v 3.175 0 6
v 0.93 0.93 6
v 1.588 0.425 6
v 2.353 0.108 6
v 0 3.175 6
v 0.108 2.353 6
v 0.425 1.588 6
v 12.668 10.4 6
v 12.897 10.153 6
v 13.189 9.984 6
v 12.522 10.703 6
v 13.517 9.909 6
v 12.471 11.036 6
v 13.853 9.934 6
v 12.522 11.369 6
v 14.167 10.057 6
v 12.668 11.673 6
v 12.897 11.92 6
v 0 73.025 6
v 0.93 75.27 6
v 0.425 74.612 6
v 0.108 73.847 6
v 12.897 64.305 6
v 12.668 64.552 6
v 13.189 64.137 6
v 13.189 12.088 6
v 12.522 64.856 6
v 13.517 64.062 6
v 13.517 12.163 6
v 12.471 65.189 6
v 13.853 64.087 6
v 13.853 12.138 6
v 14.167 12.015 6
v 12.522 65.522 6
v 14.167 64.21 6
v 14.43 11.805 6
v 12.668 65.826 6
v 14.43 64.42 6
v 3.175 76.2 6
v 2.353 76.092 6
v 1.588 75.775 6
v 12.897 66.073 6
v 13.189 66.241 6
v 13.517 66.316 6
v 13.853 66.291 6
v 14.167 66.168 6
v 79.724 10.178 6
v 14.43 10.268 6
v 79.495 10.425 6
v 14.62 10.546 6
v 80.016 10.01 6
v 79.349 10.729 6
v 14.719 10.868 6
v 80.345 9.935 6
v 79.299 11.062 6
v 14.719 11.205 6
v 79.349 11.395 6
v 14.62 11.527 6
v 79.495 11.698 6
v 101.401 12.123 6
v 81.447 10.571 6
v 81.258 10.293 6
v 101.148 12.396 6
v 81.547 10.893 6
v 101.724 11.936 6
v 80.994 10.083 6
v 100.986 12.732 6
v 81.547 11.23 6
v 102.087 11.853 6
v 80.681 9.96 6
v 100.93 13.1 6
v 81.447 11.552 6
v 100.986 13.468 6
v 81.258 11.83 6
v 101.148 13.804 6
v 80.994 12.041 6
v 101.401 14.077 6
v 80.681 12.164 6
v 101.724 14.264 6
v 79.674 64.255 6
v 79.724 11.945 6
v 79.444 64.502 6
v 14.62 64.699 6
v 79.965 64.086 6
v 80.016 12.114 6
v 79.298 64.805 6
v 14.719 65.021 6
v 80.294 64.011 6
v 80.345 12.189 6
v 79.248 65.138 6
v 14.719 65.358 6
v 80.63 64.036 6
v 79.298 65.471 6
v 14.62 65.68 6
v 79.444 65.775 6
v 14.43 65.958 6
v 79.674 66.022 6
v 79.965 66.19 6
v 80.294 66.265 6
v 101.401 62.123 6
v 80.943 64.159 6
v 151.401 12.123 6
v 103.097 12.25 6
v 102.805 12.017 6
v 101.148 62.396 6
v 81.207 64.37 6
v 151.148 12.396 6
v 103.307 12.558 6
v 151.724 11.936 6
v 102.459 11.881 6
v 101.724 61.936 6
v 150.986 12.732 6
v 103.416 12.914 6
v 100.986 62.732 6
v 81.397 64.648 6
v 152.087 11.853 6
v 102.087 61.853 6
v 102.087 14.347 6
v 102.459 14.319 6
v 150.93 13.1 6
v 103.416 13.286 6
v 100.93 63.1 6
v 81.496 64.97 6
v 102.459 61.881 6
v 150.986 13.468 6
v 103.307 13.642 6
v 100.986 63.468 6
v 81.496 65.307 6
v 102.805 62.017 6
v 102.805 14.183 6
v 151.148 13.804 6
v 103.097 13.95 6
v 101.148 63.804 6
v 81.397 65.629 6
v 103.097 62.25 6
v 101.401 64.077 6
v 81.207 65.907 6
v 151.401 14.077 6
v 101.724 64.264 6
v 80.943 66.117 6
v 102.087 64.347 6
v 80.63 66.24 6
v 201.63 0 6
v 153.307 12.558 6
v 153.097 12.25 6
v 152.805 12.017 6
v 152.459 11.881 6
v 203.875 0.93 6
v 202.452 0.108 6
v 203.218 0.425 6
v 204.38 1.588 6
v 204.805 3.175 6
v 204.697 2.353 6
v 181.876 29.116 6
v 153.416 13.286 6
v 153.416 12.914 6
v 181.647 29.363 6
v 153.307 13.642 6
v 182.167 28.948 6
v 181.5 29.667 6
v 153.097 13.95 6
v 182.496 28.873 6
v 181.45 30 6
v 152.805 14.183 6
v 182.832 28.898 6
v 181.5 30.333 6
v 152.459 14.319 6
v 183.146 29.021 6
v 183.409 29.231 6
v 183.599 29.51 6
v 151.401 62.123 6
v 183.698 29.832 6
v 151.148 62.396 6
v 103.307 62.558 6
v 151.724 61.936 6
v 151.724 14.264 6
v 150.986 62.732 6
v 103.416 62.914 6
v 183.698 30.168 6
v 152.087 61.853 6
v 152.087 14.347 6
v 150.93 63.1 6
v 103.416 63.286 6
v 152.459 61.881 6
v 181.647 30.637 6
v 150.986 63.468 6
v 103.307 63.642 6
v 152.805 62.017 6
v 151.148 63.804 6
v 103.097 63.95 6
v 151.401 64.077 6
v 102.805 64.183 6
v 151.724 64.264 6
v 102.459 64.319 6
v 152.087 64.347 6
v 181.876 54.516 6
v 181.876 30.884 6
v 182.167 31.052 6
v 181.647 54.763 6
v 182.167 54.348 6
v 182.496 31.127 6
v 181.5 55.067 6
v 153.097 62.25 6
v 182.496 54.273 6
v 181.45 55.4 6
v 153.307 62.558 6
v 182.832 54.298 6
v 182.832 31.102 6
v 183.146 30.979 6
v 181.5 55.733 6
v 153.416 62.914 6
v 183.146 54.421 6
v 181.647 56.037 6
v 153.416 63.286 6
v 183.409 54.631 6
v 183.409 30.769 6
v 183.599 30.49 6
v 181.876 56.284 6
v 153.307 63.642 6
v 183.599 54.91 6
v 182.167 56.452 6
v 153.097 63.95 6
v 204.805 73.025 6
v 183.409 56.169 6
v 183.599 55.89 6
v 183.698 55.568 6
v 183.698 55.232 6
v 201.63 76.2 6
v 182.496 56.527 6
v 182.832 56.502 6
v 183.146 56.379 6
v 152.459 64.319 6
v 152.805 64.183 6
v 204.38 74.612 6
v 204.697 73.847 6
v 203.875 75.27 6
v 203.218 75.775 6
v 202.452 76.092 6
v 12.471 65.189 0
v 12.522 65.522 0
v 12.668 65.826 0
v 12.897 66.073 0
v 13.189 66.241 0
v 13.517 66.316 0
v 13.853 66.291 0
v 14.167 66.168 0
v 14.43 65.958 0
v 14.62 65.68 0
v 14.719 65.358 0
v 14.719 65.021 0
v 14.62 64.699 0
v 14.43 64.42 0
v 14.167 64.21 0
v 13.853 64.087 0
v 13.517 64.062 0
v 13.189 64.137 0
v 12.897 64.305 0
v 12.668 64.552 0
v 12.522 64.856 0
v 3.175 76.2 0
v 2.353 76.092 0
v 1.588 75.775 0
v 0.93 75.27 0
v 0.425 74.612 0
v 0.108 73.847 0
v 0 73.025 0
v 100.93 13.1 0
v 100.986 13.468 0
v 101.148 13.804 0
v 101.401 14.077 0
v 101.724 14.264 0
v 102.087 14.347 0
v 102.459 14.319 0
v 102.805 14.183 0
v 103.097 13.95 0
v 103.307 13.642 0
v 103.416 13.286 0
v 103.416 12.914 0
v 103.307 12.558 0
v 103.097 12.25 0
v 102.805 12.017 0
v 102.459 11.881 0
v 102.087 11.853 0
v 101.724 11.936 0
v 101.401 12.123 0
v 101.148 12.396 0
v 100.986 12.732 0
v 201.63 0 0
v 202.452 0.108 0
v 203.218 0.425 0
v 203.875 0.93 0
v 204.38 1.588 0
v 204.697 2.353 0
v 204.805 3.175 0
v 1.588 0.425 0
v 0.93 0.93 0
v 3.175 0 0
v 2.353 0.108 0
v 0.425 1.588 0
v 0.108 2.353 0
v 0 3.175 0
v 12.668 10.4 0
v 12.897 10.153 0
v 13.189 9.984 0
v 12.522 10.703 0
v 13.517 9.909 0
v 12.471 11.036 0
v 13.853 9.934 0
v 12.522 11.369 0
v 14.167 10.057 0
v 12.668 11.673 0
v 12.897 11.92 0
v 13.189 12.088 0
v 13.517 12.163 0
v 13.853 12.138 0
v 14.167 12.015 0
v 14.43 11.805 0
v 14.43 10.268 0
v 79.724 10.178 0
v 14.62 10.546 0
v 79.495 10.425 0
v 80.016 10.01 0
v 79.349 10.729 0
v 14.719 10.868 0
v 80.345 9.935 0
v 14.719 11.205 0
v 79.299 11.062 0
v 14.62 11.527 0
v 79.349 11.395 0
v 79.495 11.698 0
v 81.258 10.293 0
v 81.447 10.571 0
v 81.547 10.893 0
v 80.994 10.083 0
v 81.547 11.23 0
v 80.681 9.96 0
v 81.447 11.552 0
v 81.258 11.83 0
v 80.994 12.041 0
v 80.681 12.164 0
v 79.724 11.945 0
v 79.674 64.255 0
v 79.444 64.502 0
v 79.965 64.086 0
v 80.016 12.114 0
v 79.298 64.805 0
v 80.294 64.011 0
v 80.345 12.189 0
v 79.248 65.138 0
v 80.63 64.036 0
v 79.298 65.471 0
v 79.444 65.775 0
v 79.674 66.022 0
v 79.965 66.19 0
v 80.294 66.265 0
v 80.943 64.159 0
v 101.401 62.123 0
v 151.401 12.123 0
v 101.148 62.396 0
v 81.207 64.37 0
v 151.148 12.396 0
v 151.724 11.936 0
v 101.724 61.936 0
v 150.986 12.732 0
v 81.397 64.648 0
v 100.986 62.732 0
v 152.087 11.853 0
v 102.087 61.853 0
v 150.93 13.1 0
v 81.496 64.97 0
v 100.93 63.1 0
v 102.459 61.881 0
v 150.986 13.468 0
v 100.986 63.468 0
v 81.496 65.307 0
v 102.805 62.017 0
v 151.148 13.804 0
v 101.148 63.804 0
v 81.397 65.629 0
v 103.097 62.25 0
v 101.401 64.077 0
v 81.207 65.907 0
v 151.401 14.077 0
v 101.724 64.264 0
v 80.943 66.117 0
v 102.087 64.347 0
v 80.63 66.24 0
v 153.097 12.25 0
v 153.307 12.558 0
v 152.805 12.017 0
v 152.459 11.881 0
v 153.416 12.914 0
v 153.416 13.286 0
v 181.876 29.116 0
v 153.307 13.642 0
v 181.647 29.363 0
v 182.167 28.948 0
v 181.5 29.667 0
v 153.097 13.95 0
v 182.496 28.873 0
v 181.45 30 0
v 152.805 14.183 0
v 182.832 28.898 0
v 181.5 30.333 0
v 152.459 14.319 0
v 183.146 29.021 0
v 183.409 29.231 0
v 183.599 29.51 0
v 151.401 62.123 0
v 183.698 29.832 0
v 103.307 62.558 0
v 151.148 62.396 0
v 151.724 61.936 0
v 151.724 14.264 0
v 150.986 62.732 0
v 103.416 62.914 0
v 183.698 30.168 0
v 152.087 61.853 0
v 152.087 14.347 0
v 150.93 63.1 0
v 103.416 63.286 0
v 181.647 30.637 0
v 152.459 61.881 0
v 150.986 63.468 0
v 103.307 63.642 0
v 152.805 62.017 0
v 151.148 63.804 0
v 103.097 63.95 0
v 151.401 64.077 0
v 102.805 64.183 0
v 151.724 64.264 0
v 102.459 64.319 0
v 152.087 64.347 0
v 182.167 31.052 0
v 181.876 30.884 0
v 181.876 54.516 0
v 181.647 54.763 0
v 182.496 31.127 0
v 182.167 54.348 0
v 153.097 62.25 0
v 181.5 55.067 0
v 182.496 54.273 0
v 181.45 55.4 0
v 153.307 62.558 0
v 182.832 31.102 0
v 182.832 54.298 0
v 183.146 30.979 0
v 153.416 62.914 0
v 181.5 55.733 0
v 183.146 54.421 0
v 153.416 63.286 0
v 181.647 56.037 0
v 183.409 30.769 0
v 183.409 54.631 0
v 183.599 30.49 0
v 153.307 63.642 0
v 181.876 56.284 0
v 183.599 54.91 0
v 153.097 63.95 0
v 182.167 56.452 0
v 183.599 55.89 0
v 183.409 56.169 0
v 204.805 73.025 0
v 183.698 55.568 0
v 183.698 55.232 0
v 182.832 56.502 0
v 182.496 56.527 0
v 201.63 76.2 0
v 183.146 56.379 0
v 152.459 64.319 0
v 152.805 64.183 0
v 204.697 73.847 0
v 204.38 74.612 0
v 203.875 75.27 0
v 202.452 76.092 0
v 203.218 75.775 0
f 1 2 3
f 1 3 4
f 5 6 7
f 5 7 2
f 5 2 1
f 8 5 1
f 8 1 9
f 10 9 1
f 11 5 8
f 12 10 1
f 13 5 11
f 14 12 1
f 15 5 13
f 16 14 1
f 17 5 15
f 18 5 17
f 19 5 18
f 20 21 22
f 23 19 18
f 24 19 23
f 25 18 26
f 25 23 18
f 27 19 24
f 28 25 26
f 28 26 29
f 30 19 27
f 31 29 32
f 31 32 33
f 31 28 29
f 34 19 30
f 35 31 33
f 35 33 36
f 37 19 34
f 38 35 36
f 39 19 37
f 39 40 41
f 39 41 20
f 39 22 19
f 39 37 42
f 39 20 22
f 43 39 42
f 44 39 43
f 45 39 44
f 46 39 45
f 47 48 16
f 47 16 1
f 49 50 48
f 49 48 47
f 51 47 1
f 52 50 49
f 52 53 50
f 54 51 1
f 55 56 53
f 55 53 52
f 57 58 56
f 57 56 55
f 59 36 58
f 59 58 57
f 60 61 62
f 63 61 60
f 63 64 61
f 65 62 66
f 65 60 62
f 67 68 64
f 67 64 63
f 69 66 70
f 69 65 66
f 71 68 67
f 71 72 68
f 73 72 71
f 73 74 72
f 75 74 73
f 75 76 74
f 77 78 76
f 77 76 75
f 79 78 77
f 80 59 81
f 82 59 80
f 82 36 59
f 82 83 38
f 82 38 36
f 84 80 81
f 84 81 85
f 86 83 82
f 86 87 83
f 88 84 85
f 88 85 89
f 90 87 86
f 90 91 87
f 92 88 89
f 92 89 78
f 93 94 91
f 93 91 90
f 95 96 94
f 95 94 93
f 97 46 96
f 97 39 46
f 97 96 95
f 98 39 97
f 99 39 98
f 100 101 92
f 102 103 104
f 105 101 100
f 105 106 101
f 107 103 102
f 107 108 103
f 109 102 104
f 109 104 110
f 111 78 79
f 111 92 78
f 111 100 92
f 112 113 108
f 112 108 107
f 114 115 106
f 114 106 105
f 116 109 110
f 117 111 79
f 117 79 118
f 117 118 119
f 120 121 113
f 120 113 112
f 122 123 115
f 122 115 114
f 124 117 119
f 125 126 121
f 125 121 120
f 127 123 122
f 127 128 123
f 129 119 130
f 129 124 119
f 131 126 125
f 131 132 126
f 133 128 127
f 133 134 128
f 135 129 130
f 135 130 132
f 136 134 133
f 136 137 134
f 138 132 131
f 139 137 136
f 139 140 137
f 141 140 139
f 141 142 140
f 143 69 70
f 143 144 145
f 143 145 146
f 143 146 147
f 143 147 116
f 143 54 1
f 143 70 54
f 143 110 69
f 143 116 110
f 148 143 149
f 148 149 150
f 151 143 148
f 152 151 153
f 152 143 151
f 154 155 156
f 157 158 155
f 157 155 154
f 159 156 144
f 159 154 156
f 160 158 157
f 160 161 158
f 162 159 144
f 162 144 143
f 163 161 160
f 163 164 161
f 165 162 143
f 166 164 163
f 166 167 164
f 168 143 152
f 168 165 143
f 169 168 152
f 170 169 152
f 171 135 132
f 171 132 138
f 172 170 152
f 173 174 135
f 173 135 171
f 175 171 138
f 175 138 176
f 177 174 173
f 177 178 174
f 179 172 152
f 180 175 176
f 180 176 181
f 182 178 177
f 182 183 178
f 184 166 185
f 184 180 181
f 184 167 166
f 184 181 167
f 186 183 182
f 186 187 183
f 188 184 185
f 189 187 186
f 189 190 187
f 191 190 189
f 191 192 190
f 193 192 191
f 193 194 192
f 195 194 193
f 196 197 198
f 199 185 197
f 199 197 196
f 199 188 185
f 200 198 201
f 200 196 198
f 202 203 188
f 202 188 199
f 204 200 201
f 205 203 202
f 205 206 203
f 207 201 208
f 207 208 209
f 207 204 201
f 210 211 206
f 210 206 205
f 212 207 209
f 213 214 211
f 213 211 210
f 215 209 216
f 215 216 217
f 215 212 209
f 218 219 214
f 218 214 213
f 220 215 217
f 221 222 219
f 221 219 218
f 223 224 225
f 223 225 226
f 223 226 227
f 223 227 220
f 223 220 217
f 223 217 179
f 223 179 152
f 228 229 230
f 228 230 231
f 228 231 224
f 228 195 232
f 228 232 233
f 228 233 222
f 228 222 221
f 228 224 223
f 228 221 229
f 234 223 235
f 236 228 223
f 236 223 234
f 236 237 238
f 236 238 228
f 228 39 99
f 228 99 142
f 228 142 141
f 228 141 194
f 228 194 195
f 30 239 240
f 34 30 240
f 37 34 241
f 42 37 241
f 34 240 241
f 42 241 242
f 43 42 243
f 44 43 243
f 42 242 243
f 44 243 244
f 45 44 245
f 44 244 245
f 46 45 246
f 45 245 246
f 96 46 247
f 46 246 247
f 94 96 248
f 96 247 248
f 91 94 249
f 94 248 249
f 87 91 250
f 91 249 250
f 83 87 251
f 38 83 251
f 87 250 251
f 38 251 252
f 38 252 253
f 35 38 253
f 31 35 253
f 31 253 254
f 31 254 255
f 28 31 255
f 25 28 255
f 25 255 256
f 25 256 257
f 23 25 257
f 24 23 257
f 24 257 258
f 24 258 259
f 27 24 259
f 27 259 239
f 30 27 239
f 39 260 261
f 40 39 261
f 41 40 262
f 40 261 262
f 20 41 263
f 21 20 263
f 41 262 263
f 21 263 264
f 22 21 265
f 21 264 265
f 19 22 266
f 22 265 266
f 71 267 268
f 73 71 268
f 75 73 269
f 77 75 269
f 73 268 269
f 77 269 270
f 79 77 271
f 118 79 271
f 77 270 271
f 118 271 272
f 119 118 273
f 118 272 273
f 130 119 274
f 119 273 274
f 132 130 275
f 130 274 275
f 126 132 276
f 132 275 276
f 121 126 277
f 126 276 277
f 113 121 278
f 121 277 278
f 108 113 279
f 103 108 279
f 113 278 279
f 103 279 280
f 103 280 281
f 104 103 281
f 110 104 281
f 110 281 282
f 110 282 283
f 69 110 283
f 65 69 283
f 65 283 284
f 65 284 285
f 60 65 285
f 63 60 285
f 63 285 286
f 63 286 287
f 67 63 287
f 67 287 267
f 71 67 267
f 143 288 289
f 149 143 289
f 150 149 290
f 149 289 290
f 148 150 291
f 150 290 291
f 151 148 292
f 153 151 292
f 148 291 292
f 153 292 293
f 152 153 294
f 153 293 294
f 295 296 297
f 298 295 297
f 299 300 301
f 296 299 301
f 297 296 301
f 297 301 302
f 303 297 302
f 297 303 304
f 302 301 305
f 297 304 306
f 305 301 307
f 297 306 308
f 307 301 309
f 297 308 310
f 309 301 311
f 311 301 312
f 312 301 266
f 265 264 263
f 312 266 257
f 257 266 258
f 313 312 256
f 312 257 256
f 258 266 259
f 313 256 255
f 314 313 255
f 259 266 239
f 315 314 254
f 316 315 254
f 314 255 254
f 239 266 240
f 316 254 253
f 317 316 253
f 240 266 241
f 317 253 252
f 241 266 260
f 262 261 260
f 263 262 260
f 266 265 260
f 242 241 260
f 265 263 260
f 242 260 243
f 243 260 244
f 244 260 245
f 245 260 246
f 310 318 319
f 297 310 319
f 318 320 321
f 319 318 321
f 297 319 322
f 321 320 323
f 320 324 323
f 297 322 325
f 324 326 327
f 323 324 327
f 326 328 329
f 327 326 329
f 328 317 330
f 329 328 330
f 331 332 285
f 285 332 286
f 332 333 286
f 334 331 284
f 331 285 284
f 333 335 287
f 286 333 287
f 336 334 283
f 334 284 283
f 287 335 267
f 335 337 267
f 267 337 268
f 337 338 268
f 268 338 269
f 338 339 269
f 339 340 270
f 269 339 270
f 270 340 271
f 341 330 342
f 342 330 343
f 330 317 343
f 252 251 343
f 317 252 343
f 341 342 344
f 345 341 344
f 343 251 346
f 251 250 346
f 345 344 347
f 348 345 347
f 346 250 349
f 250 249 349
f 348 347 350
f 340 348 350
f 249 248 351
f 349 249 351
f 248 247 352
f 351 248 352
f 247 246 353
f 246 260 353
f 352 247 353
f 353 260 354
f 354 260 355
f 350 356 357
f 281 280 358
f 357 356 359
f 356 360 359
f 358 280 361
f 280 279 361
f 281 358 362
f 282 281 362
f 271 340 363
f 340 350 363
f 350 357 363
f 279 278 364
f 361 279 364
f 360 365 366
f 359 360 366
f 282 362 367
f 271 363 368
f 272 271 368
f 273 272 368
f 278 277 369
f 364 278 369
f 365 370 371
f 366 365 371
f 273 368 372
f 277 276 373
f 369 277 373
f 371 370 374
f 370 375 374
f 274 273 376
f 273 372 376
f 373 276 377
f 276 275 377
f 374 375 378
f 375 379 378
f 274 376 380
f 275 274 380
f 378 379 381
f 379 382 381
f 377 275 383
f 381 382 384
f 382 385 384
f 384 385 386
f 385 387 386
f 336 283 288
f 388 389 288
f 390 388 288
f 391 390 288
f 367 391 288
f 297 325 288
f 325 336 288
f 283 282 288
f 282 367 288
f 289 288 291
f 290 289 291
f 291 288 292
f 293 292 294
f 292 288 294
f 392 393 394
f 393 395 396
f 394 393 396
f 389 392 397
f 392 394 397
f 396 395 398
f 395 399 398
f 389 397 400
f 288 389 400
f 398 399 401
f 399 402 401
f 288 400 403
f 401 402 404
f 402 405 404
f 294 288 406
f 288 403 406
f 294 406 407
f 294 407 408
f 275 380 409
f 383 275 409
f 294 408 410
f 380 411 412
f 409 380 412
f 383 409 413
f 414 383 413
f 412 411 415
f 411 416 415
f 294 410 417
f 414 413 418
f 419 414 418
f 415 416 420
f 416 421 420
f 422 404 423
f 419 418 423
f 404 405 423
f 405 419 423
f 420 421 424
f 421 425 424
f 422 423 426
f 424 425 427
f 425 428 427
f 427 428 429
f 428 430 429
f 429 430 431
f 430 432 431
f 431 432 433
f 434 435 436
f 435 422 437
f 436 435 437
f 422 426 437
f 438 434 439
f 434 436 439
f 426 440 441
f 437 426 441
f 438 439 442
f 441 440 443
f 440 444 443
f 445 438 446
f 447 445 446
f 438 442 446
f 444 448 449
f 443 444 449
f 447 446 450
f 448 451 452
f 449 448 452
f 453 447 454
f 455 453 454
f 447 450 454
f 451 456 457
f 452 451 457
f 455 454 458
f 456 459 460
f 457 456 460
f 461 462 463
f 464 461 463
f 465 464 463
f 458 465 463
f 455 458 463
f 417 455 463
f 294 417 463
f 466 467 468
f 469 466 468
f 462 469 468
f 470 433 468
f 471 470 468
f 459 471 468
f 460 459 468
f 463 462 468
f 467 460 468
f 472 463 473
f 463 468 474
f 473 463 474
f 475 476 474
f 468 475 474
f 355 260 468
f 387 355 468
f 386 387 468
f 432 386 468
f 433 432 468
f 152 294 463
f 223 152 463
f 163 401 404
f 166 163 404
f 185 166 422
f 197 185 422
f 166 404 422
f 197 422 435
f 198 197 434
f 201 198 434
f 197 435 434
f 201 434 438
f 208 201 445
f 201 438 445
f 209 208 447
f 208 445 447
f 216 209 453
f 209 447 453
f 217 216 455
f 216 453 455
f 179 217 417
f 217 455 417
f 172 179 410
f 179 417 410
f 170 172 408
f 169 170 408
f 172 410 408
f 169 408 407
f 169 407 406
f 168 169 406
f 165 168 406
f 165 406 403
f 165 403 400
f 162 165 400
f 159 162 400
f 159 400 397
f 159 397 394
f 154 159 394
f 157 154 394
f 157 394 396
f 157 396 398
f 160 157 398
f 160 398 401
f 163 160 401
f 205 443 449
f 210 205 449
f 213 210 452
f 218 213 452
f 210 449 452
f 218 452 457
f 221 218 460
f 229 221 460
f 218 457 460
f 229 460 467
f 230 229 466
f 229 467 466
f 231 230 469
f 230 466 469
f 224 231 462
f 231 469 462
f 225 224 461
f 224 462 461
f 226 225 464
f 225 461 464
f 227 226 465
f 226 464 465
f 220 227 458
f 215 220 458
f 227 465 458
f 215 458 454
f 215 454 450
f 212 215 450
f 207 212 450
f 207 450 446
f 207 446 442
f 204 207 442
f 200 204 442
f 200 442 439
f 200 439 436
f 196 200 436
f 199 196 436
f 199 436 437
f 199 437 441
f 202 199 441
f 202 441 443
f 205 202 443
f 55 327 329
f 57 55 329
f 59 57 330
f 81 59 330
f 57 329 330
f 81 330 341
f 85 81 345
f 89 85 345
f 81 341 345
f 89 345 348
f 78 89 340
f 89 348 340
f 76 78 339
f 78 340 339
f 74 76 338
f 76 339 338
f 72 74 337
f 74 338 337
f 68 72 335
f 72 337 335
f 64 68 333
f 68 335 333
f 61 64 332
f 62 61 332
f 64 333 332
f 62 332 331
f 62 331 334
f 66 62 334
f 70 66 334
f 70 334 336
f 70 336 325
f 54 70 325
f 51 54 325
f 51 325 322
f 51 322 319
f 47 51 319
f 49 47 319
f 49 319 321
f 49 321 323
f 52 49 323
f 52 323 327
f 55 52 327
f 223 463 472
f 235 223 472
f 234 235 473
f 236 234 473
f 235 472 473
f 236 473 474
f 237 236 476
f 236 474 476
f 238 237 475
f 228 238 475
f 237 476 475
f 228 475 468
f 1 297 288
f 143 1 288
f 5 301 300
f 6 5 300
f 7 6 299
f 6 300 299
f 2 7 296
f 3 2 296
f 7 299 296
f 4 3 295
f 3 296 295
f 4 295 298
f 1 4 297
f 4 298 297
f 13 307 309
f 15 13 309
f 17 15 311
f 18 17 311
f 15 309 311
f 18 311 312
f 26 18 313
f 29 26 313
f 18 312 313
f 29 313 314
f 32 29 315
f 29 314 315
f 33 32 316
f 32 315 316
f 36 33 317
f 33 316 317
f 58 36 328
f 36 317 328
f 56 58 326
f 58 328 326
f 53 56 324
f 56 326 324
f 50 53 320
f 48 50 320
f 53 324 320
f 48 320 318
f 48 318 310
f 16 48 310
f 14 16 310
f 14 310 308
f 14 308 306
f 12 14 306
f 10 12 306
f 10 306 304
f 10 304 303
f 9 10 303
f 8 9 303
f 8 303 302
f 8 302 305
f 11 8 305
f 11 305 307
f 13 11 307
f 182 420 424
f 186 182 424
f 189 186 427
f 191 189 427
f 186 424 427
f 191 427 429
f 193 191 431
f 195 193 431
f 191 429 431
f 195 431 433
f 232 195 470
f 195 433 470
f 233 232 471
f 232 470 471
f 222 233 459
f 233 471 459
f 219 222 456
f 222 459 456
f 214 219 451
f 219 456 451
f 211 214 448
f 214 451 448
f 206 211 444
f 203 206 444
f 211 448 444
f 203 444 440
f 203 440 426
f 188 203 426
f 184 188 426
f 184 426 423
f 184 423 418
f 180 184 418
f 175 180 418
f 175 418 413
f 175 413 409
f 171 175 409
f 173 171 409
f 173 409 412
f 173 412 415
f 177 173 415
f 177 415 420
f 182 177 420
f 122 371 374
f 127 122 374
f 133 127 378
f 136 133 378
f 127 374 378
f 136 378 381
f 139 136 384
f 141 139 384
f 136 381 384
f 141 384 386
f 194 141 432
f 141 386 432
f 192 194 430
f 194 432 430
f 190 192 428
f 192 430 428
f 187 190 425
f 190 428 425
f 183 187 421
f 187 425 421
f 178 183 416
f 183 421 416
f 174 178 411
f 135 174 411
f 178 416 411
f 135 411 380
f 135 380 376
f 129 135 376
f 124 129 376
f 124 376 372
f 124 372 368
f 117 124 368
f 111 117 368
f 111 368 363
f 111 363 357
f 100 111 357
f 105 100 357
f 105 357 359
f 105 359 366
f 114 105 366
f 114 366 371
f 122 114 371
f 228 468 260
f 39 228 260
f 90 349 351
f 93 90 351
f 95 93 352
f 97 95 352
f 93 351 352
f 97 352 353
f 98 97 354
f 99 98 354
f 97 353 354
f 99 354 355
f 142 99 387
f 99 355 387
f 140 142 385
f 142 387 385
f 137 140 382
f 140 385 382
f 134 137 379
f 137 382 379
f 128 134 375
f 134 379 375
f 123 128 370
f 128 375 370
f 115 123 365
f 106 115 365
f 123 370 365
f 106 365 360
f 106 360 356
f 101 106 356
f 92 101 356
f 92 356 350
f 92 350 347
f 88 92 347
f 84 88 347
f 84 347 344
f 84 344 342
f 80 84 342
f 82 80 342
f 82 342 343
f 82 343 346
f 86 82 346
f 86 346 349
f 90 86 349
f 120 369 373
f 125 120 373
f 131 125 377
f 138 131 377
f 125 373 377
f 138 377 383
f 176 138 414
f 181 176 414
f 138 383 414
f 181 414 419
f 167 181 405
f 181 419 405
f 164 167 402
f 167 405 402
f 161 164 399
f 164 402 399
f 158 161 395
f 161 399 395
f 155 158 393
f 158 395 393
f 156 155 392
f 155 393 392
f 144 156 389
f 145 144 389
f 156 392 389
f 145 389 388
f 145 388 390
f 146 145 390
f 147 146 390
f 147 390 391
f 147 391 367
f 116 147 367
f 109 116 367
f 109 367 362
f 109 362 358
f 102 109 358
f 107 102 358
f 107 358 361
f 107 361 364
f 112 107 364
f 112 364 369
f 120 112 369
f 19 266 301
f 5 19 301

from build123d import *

# Parameters (mm, degrees)
BOSS_EXTRUDE1_DEPTH   = 6
F_4_40_TAPPED_HOLE1_D = 2.2606
M3X0_5_TAPPED_HOLE1_D = 2.5


with BuildPart() as part:
    # Sketch1 → Boss-Extrude1 (new body)
    with BuildSketch(Plane.XY):
        with BuildLine():
            Line((3.175, 0), (201.6304, 0))
            ThreePointArc((201.6304, 0), (203.87546403, 0.92993597), (204.8054, 3.175))
            Line((204.8054, 3.175), (204.8054, 73.025))
            ThreePointArc((204.8054, 73.025), (203.87546403, 75.27006403), (201.6304, 76.2))
            Line((201.6304, 76.2), (3.175, 76.2))
            ThreePointArc((3.175, 76.2), (0.92993597, 75.27006403), (0, 73.025))
            Line((0, 73.025), (0, 3.175))
            ThreePointArc((0, 3.175), (0.92993597, 0.92993597), (3.175, 0))
        make_face()
    extrude(amount=BOSS_EXTRUDE1_DEPTH)

    # #4-40 Tapped Hole1 (through all)
    with Locations(Plane.XY.offset(6)):
        with Locations((13.6017, 65.1891), (13.6017, 11.0363), (80.4291, 11.0617), (80.3783, 65.1383), (182.5804, 30), (182.5804, 55.4)):
            Hole(F_4_40_TAPPED_HOLE1_D / 2)

    # M3x0.5 Tapped Hole1 (through all)
    with Locations(Plane.XY.offset(6)):
        with Locations((102.1804, 63.1), (152.1804, 63.1), (152.1804, 13.1), (102.1804, 13.1)):
            Hole(M3X0_5_TAPPED_HOLE1_D / 2)


solid = part.part
